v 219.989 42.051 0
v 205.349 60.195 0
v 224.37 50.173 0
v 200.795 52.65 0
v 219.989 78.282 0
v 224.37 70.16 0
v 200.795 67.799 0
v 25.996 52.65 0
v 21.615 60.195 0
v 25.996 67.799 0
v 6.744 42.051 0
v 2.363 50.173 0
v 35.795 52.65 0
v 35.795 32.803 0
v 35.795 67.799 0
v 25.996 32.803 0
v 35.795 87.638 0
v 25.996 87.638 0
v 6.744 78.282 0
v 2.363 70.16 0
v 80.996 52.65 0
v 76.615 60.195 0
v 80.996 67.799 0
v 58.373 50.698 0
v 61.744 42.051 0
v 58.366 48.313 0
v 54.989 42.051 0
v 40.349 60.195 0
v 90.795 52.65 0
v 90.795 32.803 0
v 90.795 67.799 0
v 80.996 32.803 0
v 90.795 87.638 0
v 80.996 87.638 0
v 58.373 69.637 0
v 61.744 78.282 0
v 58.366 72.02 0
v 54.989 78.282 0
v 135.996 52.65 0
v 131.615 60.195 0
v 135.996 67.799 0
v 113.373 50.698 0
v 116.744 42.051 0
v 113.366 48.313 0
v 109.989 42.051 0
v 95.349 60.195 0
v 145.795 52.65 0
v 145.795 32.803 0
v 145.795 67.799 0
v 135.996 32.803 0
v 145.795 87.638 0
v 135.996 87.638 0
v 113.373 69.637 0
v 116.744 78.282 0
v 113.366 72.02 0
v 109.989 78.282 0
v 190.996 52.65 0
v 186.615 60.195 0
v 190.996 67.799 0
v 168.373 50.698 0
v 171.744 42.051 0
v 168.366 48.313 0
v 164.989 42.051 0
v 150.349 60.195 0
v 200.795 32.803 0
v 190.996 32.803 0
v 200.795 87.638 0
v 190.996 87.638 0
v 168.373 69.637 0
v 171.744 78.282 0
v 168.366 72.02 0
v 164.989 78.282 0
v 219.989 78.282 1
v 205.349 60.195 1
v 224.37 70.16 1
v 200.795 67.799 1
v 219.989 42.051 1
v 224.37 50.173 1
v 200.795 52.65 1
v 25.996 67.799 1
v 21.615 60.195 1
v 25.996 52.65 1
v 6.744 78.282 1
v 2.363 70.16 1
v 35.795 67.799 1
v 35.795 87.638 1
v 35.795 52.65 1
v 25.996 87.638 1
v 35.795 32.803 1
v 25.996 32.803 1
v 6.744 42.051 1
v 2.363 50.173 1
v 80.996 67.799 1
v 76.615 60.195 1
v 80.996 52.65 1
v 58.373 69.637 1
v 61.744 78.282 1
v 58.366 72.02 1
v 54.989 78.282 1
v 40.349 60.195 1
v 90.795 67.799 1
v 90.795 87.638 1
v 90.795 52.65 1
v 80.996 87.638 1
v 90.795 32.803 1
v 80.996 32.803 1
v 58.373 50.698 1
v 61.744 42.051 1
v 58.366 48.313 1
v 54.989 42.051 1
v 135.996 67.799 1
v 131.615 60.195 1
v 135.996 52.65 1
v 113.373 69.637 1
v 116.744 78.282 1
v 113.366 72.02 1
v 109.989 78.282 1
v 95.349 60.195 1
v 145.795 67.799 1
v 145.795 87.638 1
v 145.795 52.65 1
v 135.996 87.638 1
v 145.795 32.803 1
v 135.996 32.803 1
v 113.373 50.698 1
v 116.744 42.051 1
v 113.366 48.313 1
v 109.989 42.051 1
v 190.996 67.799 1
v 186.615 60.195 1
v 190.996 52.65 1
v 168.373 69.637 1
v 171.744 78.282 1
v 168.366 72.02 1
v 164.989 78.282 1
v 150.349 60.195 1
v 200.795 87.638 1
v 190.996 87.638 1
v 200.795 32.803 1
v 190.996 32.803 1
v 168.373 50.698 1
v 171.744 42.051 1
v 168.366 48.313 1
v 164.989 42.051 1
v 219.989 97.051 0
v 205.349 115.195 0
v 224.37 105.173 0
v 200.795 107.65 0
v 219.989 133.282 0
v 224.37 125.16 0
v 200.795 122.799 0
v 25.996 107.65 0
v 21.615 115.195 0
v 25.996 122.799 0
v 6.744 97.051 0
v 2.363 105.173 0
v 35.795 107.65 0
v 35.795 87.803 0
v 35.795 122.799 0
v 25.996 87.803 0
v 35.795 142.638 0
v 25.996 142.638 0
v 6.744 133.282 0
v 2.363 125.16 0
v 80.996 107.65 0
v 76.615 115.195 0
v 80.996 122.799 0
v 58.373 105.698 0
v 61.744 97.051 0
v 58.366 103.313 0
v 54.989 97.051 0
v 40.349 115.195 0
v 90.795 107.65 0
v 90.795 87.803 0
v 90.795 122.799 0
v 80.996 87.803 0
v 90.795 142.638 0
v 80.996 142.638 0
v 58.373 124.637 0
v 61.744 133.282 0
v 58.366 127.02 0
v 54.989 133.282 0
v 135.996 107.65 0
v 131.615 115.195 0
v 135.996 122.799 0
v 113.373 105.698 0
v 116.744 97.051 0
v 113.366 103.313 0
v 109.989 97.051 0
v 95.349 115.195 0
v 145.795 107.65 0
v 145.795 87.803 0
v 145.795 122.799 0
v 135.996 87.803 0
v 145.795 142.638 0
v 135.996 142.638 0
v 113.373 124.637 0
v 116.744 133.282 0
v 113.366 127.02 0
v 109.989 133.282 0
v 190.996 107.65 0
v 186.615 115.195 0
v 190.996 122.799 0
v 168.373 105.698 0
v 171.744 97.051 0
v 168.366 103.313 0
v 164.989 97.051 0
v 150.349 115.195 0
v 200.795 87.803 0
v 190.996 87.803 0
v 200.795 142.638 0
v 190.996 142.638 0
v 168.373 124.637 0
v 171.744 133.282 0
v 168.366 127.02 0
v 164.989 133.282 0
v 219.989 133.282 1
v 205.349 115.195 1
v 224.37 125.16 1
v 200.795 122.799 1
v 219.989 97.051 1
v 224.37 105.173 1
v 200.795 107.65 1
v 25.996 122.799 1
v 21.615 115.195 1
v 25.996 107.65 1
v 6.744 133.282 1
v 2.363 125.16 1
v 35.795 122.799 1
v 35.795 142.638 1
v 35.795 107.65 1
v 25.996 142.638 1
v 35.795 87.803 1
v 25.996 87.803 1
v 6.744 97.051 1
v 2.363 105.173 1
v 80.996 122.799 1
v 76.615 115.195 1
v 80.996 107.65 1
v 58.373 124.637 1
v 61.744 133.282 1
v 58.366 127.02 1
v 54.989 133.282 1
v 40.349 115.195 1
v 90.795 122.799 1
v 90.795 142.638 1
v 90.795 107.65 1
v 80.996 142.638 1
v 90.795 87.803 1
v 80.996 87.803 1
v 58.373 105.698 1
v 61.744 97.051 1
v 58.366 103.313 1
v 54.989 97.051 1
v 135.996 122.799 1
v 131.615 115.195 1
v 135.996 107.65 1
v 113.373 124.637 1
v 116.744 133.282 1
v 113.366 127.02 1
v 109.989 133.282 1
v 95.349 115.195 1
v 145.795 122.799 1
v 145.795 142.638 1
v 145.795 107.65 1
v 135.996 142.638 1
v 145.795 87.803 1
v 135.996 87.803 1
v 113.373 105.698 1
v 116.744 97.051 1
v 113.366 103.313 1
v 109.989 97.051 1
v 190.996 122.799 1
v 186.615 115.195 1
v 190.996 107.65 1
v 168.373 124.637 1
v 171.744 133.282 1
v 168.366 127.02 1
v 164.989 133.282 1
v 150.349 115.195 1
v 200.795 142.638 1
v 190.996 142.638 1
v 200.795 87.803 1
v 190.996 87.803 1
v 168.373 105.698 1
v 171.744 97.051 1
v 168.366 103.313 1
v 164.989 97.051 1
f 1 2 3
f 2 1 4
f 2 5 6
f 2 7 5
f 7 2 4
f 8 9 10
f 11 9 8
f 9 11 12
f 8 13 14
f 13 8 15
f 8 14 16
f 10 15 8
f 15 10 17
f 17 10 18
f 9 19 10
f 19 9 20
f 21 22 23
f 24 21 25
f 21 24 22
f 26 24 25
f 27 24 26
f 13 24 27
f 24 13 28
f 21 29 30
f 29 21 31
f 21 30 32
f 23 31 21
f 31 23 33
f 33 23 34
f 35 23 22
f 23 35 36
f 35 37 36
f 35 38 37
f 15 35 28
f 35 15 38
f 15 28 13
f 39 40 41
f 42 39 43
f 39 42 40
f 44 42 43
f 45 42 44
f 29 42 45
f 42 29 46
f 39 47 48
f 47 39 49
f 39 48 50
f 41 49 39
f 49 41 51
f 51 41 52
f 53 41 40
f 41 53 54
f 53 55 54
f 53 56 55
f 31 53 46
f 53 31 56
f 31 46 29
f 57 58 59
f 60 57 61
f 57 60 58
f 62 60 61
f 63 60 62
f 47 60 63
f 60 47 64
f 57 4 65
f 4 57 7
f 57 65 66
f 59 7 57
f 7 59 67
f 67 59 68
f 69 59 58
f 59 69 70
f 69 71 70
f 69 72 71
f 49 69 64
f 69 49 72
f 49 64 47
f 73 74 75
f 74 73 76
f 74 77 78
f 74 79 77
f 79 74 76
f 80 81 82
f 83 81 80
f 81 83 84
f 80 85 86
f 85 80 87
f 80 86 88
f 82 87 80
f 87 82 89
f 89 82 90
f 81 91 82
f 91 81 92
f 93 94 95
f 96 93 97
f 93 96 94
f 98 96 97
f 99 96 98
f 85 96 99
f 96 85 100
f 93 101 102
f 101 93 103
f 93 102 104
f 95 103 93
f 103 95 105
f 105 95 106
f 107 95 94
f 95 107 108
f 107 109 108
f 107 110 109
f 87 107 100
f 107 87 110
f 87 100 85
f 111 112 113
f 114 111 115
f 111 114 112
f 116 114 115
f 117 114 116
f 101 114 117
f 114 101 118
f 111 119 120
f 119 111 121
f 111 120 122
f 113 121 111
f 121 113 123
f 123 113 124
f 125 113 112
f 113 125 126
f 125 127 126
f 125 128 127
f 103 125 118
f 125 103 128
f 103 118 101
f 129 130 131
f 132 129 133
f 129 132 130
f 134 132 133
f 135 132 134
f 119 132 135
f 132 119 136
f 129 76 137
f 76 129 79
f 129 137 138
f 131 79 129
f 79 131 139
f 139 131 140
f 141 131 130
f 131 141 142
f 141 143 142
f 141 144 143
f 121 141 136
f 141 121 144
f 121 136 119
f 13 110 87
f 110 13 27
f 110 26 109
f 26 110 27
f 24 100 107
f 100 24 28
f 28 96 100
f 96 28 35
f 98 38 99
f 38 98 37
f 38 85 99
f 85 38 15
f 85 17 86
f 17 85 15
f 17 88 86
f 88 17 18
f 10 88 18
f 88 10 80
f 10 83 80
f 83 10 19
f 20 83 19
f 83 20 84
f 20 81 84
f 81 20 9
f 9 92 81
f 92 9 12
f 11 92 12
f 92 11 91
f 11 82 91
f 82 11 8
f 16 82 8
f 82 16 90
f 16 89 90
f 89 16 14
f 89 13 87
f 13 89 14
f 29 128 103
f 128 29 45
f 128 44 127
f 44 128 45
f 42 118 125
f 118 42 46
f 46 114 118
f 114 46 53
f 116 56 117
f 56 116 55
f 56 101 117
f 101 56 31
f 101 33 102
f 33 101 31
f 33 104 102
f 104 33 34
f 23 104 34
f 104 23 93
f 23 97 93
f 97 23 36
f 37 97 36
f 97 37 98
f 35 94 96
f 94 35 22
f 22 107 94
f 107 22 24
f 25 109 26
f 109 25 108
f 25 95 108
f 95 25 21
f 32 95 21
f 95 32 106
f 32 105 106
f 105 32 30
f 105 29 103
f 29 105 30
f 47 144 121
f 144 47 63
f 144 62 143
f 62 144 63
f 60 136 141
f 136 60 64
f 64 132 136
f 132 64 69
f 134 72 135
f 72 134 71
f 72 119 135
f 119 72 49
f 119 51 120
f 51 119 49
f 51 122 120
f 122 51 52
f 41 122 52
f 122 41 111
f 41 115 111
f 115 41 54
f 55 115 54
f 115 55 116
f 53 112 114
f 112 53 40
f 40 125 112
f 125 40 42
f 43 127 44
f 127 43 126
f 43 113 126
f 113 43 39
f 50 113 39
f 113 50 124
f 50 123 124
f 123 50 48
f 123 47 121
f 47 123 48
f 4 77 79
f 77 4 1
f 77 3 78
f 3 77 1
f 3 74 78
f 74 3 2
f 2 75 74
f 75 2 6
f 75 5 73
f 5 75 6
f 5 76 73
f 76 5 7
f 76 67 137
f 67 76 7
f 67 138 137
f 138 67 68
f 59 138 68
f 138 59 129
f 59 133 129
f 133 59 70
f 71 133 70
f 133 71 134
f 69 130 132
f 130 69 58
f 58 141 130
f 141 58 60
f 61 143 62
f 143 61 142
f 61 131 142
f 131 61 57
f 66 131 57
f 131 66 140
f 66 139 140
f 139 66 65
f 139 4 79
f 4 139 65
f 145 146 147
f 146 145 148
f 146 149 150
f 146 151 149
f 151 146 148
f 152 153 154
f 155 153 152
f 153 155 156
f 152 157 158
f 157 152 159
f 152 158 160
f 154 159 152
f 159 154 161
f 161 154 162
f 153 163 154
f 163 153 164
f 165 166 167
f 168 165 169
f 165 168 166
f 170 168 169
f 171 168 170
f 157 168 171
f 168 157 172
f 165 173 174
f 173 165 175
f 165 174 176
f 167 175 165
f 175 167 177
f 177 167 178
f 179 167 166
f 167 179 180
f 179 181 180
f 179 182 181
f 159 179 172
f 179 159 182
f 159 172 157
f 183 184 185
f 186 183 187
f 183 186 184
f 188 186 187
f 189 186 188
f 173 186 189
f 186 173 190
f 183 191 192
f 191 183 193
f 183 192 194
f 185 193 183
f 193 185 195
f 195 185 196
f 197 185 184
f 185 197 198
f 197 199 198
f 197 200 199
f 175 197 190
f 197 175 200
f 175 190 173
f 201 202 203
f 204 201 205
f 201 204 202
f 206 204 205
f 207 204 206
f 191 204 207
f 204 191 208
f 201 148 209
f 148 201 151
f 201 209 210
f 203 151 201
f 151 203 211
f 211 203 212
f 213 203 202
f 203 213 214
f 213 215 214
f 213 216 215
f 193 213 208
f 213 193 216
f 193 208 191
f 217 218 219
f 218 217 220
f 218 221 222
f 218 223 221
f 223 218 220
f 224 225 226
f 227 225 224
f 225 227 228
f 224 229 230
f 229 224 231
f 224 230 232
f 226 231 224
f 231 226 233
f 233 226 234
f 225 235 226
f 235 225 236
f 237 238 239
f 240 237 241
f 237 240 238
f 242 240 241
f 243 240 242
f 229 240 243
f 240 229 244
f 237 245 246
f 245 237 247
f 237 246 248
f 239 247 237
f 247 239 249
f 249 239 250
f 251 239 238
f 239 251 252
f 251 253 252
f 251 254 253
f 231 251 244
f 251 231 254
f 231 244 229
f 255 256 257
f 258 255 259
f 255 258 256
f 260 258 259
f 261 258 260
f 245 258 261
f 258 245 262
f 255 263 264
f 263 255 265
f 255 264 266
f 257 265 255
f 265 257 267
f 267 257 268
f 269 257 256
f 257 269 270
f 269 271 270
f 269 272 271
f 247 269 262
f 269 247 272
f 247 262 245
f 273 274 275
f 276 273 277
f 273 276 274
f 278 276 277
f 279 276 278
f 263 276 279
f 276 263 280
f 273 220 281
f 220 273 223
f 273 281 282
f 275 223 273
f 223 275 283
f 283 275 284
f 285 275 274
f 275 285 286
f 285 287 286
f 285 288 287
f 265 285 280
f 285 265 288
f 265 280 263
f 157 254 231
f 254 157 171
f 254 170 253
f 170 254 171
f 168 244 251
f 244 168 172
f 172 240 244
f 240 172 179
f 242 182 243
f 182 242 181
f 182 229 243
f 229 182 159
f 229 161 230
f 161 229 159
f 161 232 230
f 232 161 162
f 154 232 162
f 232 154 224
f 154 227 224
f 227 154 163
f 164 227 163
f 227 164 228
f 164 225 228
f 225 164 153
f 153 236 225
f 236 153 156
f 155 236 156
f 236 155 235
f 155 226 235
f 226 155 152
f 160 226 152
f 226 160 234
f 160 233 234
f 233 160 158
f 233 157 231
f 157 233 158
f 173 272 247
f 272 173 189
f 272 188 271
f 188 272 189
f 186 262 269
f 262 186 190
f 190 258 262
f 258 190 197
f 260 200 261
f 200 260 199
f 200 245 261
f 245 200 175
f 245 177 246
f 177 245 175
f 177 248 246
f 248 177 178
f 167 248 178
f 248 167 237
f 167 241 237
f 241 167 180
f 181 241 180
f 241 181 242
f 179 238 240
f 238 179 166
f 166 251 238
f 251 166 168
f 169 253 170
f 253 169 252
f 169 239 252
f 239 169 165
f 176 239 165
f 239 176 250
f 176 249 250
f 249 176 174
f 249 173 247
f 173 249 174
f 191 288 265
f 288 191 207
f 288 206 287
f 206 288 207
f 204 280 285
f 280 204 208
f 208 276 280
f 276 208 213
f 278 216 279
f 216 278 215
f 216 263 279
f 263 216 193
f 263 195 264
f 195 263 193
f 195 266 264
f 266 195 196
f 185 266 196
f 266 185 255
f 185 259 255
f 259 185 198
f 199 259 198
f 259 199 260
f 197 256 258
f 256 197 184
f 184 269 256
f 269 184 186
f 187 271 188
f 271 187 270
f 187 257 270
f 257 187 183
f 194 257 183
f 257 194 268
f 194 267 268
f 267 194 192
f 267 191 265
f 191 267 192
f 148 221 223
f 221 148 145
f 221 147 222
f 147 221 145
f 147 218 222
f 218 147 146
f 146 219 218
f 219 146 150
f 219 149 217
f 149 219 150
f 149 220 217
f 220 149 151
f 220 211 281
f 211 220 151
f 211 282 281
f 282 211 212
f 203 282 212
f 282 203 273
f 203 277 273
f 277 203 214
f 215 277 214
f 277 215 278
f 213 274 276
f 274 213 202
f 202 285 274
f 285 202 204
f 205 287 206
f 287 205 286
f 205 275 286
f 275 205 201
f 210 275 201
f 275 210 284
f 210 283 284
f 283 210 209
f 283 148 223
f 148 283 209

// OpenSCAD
for(y = [0,1])
{
    for(x=[0:3])
    {
        translate([x*55,y*55,0])
        linear_extrude(1)
        text("*", 85, "Roboto:style=Bold");
    }
}
